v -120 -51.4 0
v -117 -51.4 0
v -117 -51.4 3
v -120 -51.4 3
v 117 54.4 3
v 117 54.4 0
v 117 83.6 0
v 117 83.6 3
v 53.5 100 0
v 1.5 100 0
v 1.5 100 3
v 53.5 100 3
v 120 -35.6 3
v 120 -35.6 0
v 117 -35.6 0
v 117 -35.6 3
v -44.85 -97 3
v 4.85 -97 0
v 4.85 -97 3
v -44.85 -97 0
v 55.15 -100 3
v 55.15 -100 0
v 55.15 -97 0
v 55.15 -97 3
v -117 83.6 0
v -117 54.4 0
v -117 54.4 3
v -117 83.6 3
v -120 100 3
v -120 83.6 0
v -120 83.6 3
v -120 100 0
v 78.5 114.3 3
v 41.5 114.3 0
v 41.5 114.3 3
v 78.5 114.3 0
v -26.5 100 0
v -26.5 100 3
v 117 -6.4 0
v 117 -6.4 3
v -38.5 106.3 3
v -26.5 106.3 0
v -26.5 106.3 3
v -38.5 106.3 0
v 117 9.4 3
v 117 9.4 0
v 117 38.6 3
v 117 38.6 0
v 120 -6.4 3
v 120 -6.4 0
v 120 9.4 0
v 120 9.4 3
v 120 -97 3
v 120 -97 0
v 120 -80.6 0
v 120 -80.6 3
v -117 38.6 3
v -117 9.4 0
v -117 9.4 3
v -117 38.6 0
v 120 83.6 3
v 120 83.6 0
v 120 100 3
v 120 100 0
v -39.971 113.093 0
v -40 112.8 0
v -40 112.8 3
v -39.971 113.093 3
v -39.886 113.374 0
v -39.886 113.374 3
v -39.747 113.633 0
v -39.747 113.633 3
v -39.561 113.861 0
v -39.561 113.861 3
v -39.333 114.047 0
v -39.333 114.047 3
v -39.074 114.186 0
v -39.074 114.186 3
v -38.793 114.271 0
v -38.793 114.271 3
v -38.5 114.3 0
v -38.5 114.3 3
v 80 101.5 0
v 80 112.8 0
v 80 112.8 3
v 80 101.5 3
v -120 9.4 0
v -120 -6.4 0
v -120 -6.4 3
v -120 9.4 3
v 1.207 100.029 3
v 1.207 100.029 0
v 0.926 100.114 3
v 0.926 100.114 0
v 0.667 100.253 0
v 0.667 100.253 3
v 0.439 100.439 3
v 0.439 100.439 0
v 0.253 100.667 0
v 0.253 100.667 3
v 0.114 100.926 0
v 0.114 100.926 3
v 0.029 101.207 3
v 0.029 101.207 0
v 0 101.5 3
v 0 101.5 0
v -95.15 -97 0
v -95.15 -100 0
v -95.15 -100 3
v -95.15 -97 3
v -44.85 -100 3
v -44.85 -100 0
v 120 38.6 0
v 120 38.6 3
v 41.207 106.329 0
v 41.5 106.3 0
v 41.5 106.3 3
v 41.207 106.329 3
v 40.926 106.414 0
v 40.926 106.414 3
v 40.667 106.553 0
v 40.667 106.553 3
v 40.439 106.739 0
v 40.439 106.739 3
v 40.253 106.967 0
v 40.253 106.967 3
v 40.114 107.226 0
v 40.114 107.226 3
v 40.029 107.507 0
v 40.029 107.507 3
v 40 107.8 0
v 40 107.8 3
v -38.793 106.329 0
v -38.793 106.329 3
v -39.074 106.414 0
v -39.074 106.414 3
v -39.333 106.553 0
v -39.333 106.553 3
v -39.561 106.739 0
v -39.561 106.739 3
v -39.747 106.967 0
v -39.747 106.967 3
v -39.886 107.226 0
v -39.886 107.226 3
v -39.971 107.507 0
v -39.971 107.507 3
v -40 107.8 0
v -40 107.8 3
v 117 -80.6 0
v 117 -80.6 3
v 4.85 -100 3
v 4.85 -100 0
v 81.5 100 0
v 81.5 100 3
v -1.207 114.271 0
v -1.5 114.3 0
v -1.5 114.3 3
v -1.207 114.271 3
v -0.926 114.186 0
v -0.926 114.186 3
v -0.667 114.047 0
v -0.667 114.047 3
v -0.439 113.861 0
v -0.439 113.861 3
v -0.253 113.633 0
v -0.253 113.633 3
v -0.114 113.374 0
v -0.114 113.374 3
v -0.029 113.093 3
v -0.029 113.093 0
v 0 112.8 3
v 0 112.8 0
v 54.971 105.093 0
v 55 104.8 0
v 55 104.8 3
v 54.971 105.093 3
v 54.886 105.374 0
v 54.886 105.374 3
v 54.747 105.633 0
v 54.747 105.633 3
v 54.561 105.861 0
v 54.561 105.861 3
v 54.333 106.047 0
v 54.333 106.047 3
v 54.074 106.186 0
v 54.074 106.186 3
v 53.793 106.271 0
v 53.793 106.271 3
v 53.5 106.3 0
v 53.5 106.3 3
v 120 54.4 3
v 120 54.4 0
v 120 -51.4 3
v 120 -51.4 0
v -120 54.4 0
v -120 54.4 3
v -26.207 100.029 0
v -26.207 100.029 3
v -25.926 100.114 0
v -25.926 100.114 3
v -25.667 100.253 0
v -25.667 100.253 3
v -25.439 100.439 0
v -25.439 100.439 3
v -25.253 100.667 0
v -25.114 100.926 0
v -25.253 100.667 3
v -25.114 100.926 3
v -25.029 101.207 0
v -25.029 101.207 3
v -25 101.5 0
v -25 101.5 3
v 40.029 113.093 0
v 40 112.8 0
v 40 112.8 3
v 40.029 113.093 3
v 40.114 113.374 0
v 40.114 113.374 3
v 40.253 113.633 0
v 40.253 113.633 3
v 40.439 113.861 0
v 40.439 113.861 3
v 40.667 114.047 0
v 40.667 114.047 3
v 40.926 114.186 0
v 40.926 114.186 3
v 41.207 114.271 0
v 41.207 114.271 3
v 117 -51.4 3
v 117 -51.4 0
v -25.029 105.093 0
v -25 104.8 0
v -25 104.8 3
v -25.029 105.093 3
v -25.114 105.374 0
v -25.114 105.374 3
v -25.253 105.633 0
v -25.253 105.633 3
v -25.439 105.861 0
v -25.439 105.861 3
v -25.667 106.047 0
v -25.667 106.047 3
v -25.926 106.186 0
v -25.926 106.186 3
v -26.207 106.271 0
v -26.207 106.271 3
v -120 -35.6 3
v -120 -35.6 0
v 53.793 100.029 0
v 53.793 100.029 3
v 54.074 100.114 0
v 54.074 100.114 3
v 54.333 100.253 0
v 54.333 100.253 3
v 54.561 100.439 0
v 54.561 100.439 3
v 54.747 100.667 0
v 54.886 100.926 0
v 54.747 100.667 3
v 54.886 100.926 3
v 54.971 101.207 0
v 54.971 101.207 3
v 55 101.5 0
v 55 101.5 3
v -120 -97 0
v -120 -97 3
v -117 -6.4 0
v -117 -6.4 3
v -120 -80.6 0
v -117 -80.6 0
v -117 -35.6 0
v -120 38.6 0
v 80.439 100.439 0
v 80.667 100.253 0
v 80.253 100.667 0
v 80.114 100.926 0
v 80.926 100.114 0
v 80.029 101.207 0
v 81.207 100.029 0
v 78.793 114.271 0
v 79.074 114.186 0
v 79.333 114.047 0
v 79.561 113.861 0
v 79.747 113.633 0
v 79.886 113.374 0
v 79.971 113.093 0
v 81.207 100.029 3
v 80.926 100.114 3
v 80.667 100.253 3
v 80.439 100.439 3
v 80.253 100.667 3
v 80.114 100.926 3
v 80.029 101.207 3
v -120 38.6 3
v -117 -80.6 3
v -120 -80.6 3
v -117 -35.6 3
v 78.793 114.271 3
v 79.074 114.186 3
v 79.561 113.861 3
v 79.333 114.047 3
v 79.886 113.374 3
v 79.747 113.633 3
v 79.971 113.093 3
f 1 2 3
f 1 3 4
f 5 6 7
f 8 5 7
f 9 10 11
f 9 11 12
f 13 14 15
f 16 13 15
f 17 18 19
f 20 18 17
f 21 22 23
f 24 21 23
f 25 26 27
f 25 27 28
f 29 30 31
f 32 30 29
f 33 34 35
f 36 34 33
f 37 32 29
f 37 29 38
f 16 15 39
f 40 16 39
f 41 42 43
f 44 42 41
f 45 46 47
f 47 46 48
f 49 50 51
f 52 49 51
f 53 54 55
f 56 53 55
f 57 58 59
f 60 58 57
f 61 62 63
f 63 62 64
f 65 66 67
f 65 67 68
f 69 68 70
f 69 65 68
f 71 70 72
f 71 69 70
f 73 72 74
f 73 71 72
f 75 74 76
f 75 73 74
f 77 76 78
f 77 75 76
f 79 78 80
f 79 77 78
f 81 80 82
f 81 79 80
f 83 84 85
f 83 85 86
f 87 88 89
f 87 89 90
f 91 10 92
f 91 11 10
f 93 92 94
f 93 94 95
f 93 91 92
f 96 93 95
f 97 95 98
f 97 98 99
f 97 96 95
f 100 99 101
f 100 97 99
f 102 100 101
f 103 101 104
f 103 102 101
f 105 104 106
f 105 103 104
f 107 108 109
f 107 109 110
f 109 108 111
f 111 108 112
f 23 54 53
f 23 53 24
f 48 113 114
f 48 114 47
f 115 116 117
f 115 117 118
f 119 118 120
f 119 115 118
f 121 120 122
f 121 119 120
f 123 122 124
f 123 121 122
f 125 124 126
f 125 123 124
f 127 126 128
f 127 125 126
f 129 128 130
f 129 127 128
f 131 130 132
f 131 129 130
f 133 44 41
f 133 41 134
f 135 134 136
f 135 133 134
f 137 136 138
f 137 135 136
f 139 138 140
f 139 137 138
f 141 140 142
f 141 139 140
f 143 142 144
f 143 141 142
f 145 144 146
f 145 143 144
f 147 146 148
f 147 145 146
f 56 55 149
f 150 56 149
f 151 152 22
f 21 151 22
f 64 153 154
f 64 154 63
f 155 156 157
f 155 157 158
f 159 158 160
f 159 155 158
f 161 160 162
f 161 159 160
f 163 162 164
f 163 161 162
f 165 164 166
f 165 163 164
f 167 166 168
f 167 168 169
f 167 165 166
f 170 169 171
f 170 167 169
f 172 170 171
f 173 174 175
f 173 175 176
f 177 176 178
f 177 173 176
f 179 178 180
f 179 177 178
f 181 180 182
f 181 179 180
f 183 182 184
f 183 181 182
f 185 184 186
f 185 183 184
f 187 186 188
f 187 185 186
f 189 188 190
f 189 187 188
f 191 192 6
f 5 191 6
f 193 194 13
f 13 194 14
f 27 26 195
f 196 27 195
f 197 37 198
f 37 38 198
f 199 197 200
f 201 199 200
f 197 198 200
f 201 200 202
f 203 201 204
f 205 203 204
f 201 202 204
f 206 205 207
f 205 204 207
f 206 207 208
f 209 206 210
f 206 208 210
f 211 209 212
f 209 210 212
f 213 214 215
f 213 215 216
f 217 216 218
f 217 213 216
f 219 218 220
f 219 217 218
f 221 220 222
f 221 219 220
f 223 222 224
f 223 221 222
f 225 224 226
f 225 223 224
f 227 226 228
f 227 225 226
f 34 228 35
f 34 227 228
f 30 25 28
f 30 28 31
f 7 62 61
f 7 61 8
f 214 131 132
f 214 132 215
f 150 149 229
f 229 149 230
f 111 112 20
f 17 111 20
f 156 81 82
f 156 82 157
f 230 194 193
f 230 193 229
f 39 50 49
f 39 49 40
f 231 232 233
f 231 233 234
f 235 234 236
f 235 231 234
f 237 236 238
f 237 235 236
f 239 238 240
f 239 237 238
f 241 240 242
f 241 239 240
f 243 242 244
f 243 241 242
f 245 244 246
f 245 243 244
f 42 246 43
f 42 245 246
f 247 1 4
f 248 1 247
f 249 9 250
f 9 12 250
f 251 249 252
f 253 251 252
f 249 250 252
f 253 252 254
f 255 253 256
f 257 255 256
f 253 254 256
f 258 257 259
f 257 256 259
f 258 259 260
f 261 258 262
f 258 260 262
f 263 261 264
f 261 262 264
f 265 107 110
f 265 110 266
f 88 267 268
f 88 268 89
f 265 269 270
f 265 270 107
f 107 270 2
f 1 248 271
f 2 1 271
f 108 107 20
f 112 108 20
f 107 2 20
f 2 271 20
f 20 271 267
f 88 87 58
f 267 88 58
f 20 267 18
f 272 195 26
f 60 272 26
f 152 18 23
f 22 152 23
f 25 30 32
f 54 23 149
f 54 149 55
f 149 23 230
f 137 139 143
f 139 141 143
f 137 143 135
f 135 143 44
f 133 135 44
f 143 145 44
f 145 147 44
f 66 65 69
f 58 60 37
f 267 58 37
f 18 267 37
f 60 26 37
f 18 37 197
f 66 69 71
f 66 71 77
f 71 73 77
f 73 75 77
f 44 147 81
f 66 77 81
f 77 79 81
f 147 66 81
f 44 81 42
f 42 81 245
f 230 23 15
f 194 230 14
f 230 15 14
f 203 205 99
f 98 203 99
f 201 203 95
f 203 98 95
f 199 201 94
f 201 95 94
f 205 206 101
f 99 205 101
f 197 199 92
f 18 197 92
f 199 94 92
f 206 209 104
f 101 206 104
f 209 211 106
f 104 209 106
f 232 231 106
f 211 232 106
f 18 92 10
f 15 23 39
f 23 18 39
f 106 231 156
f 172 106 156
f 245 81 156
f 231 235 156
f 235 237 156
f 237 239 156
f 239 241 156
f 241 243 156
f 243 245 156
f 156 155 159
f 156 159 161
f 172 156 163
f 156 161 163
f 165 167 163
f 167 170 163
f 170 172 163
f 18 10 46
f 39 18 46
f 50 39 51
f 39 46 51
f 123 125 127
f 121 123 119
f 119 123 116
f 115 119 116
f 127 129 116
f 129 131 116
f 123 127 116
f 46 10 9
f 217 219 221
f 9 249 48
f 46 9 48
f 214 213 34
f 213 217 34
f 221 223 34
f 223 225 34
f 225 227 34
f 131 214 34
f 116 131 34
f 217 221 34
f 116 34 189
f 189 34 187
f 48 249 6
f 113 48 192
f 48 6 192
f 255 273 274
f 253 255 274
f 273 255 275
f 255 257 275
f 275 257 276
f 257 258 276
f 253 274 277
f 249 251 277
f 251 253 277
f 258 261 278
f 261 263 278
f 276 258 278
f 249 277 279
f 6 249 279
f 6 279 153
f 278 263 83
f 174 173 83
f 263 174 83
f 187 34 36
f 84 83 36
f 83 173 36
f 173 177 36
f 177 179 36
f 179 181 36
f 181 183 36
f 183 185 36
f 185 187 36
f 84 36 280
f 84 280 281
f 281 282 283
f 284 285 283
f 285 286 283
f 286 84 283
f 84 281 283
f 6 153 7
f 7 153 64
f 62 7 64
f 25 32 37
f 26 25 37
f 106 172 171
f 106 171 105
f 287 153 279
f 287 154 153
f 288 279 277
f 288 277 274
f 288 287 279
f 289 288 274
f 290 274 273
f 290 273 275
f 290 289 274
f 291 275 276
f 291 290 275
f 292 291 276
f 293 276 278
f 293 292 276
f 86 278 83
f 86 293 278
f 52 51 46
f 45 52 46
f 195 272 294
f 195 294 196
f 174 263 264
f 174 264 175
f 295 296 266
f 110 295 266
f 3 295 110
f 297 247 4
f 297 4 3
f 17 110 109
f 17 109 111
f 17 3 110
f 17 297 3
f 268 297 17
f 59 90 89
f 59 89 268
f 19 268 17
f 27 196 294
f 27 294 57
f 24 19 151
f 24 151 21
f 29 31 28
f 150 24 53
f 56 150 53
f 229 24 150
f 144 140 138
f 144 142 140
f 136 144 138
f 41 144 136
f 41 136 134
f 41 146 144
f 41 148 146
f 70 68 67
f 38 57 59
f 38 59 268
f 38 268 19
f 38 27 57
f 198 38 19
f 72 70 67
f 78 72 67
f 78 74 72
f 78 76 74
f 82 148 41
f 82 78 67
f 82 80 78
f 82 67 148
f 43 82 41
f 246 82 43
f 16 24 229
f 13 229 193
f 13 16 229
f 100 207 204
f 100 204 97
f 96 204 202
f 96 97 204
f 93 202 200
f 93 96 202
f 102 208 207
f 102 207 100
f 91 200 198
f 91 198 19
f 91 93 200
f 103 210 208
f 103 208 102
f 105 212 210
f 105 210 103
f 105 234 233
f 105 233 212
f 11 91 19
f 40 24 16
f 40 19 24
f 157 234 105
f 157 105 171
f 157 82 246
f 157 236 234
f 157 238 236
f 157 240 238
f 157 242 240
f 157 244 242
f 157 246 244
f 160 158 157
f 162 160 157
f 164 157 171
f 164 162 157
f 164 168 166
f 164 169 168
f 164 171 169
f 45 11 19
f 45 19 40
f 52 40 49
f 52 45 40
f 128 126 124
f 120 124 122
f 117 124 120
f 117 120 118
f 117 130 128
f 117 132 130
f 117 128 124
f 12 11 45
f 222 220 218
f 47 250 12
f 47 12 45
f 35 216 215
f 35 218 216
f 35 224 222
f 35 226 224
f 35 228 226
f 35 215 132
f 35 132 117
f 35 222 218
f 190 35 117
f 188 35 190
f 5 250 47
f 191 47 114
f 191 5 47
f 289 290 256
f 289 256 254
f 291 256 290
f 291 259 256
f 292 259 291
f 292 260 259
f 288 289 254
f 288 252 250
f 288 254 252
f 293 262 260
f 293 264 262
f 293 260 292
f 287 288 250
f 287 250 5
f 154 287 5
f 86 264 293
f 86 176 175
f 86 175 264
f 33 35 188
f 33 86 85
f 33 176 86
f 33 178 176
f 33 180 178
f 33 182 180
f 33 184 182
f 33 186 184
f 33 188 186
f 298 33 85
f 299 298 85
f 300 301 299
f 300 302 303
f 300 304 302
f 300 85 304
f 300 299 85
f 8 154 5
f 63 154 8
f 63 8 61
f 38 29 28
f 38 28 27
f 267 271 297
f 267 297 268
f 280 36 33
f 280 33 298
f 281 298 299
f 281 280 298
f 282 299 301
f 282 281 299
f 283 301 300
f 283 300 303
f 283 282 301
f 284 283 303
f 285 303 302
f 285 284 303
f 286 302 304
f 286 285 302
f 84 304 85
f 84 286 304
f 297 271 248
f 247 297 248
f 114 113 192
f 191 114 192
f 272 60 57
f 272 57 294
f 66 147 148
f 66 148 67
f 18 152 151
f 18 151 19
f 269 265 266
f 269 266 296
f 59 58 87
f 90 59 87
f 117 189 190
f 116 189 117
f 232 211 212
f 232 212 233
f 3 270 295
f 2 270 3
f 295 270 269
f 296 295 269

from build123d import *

# Parameters (mm, degrees)
CROQUIS1_W              = 240
CROQUIS1_H              = 200
SALIENTE_EXTRUIR1_DEPTH = 3
CROQUIS2_W              = 3
CROQUIS2_H              = 29.2
CROQUIS2_W_2            = 24.85
CROQUIS2_H_2            = 3
CROQUIS2_W_3            = 49.7
CROQUIS2_W_4            = 66.784595416
CORTAR_EXTRUIR1_DEPTH   = 4
SALIENTE_EXTRUIR2_DEPTH = 3
REDONDEO1_R             = 1.5


with BuildPart() as part:
    # Croquis1 → Saliente-Extruir1 (new body)
    with BuildSketch(Plane.XY):
        Rectangle(CROQUIS1_W, CROQUIS1_H)
    extrude(amount=SALIENTE_EXTRUIR1_DEPTH)

    # Croquis2 → Cortar-Extruir1 (cut, through all)
    with BuildSketch(Plane(origin=(0, 0, 0), x_dir=(-1, 0, 0), z_dir=(0, 0, -1))):
        with Locations((-118.5, -66)):
            Rectangle(CROQUIS2_W, CROQUIS2_H)
        with Locations((-118.5, -21)):
            Rectangle(CROQUIS2_W, CROQUIS2_H)
        with Locations((-118.5, 24)):
            Rectangle(CROQUIS2_W, CROQUIS2_H)
        with Locations((-118.5, 69)):
            Rectangle(CROQUIS2_W, CROQUIS2_H)
        with Locations((107.575, -98.5)):
            Rectangle(CROQUIS2_W_2, CROQUIS2_H_2)
        with Locations((20, -98.5)):
            Rectangle(CROQUIS2_W_3, CROQUIS2_H_2)
        with Locations((-88.542297708, -98.5)):
            Rectangle(CROQUIS2_W_4, CROQUIS2_H_2)
        with Locations((118.5, -66)):
            Rectangle(CROQUIS2_W, CROQUIS2_H)
        with Locations((118.5, -21)):
            Rectangle(CROQUIS2_W, CROQUIS2_H)
        with Locations((118.5, 24)):
            Rectangle(CROQUIS2_W, CROQUIS2_H)
        with Locations((118.5, 69)):
            Rectangle(CROQUIS2_W, CROQUIS2_H)
    extrude(amount=-CORTAR_EXTRUIR1_DEPTH, mode=Mode.SUBTRACT)

    # Croquis3 → Saliente-Extruir2 (add)
    with BuildSketch(Plane(origin=(0, 0, 0), x_dir=(-1, 0, 0), z_dir=(0, 0, -1))):
        with BuildLine():
            Line((-55, 100), (-55, 104.8))
            ThreePointArc((-55, 104.8), (-54.560660172, 105.860660172), (-53.5, 106.3))
            Line((-53.5, 106.3), (-41.5, 106.3))
            ThreePointArc((-41.5, 106.3), (-40.439339828, 106.739339828), (-40, 107.8))
            Line((-40, 107.8), (-40, 112.8))
            ThreePointArc((-40, 112.8), (-40.439339828, 113.860660172), (-41.5, 114.3))
            Line((-41.5, 114.3), (-78.5, 114.3))
            ThreePointArc((-78.5, 114.3), (-79.560660172, 113.860660172), (-80, 112.8))
            Line((-80, 112.8), (-80, 100))
            Line((-80, 100), (-55, 100))
        make_face()
        with BuildLine():
            Line((0, 100), (25, 100))
            Line((25, 100), (25, 104.8))
            ThreePointArc((25, 104.8), (25.439339828, 105.860660172), (26.5, 106.3))
            Line((26.5, 106.3), (38.5, 106.3))
            ThreePointArc((38.5, 106.3), (39.560660172, 106.739339828), (40, 107.8))
            Line((40, 107.8), (40, 112.8))
            ThreePointArc((40, 112.8), (39.560660172, 113.860660172), (38.5, 114.3))
            Line((38.5, 114.3), (1.5, 114.3))
            ThreePointArc((1.5, 114.3), (0.439339828, 113.860660172), (0, 112.8))
            Line((0, 112.8), (0, 100))
        make_face()
    extrude(amount=-SALIENTE_EXTRUIR2_DEPTH)

    # Redondeo1
    redondeo1_edges = [part.edges().sort_by_distance(p)[0] for p in [
        (55, 100, 1.5),
        (80, 100, 1.5),
        (-25, 100, 1.5),
        (0, 100, 1.5),
    ]]
    fillet(redondeo1_edges, radius=REDONDEO1_R)


solid = part.part
